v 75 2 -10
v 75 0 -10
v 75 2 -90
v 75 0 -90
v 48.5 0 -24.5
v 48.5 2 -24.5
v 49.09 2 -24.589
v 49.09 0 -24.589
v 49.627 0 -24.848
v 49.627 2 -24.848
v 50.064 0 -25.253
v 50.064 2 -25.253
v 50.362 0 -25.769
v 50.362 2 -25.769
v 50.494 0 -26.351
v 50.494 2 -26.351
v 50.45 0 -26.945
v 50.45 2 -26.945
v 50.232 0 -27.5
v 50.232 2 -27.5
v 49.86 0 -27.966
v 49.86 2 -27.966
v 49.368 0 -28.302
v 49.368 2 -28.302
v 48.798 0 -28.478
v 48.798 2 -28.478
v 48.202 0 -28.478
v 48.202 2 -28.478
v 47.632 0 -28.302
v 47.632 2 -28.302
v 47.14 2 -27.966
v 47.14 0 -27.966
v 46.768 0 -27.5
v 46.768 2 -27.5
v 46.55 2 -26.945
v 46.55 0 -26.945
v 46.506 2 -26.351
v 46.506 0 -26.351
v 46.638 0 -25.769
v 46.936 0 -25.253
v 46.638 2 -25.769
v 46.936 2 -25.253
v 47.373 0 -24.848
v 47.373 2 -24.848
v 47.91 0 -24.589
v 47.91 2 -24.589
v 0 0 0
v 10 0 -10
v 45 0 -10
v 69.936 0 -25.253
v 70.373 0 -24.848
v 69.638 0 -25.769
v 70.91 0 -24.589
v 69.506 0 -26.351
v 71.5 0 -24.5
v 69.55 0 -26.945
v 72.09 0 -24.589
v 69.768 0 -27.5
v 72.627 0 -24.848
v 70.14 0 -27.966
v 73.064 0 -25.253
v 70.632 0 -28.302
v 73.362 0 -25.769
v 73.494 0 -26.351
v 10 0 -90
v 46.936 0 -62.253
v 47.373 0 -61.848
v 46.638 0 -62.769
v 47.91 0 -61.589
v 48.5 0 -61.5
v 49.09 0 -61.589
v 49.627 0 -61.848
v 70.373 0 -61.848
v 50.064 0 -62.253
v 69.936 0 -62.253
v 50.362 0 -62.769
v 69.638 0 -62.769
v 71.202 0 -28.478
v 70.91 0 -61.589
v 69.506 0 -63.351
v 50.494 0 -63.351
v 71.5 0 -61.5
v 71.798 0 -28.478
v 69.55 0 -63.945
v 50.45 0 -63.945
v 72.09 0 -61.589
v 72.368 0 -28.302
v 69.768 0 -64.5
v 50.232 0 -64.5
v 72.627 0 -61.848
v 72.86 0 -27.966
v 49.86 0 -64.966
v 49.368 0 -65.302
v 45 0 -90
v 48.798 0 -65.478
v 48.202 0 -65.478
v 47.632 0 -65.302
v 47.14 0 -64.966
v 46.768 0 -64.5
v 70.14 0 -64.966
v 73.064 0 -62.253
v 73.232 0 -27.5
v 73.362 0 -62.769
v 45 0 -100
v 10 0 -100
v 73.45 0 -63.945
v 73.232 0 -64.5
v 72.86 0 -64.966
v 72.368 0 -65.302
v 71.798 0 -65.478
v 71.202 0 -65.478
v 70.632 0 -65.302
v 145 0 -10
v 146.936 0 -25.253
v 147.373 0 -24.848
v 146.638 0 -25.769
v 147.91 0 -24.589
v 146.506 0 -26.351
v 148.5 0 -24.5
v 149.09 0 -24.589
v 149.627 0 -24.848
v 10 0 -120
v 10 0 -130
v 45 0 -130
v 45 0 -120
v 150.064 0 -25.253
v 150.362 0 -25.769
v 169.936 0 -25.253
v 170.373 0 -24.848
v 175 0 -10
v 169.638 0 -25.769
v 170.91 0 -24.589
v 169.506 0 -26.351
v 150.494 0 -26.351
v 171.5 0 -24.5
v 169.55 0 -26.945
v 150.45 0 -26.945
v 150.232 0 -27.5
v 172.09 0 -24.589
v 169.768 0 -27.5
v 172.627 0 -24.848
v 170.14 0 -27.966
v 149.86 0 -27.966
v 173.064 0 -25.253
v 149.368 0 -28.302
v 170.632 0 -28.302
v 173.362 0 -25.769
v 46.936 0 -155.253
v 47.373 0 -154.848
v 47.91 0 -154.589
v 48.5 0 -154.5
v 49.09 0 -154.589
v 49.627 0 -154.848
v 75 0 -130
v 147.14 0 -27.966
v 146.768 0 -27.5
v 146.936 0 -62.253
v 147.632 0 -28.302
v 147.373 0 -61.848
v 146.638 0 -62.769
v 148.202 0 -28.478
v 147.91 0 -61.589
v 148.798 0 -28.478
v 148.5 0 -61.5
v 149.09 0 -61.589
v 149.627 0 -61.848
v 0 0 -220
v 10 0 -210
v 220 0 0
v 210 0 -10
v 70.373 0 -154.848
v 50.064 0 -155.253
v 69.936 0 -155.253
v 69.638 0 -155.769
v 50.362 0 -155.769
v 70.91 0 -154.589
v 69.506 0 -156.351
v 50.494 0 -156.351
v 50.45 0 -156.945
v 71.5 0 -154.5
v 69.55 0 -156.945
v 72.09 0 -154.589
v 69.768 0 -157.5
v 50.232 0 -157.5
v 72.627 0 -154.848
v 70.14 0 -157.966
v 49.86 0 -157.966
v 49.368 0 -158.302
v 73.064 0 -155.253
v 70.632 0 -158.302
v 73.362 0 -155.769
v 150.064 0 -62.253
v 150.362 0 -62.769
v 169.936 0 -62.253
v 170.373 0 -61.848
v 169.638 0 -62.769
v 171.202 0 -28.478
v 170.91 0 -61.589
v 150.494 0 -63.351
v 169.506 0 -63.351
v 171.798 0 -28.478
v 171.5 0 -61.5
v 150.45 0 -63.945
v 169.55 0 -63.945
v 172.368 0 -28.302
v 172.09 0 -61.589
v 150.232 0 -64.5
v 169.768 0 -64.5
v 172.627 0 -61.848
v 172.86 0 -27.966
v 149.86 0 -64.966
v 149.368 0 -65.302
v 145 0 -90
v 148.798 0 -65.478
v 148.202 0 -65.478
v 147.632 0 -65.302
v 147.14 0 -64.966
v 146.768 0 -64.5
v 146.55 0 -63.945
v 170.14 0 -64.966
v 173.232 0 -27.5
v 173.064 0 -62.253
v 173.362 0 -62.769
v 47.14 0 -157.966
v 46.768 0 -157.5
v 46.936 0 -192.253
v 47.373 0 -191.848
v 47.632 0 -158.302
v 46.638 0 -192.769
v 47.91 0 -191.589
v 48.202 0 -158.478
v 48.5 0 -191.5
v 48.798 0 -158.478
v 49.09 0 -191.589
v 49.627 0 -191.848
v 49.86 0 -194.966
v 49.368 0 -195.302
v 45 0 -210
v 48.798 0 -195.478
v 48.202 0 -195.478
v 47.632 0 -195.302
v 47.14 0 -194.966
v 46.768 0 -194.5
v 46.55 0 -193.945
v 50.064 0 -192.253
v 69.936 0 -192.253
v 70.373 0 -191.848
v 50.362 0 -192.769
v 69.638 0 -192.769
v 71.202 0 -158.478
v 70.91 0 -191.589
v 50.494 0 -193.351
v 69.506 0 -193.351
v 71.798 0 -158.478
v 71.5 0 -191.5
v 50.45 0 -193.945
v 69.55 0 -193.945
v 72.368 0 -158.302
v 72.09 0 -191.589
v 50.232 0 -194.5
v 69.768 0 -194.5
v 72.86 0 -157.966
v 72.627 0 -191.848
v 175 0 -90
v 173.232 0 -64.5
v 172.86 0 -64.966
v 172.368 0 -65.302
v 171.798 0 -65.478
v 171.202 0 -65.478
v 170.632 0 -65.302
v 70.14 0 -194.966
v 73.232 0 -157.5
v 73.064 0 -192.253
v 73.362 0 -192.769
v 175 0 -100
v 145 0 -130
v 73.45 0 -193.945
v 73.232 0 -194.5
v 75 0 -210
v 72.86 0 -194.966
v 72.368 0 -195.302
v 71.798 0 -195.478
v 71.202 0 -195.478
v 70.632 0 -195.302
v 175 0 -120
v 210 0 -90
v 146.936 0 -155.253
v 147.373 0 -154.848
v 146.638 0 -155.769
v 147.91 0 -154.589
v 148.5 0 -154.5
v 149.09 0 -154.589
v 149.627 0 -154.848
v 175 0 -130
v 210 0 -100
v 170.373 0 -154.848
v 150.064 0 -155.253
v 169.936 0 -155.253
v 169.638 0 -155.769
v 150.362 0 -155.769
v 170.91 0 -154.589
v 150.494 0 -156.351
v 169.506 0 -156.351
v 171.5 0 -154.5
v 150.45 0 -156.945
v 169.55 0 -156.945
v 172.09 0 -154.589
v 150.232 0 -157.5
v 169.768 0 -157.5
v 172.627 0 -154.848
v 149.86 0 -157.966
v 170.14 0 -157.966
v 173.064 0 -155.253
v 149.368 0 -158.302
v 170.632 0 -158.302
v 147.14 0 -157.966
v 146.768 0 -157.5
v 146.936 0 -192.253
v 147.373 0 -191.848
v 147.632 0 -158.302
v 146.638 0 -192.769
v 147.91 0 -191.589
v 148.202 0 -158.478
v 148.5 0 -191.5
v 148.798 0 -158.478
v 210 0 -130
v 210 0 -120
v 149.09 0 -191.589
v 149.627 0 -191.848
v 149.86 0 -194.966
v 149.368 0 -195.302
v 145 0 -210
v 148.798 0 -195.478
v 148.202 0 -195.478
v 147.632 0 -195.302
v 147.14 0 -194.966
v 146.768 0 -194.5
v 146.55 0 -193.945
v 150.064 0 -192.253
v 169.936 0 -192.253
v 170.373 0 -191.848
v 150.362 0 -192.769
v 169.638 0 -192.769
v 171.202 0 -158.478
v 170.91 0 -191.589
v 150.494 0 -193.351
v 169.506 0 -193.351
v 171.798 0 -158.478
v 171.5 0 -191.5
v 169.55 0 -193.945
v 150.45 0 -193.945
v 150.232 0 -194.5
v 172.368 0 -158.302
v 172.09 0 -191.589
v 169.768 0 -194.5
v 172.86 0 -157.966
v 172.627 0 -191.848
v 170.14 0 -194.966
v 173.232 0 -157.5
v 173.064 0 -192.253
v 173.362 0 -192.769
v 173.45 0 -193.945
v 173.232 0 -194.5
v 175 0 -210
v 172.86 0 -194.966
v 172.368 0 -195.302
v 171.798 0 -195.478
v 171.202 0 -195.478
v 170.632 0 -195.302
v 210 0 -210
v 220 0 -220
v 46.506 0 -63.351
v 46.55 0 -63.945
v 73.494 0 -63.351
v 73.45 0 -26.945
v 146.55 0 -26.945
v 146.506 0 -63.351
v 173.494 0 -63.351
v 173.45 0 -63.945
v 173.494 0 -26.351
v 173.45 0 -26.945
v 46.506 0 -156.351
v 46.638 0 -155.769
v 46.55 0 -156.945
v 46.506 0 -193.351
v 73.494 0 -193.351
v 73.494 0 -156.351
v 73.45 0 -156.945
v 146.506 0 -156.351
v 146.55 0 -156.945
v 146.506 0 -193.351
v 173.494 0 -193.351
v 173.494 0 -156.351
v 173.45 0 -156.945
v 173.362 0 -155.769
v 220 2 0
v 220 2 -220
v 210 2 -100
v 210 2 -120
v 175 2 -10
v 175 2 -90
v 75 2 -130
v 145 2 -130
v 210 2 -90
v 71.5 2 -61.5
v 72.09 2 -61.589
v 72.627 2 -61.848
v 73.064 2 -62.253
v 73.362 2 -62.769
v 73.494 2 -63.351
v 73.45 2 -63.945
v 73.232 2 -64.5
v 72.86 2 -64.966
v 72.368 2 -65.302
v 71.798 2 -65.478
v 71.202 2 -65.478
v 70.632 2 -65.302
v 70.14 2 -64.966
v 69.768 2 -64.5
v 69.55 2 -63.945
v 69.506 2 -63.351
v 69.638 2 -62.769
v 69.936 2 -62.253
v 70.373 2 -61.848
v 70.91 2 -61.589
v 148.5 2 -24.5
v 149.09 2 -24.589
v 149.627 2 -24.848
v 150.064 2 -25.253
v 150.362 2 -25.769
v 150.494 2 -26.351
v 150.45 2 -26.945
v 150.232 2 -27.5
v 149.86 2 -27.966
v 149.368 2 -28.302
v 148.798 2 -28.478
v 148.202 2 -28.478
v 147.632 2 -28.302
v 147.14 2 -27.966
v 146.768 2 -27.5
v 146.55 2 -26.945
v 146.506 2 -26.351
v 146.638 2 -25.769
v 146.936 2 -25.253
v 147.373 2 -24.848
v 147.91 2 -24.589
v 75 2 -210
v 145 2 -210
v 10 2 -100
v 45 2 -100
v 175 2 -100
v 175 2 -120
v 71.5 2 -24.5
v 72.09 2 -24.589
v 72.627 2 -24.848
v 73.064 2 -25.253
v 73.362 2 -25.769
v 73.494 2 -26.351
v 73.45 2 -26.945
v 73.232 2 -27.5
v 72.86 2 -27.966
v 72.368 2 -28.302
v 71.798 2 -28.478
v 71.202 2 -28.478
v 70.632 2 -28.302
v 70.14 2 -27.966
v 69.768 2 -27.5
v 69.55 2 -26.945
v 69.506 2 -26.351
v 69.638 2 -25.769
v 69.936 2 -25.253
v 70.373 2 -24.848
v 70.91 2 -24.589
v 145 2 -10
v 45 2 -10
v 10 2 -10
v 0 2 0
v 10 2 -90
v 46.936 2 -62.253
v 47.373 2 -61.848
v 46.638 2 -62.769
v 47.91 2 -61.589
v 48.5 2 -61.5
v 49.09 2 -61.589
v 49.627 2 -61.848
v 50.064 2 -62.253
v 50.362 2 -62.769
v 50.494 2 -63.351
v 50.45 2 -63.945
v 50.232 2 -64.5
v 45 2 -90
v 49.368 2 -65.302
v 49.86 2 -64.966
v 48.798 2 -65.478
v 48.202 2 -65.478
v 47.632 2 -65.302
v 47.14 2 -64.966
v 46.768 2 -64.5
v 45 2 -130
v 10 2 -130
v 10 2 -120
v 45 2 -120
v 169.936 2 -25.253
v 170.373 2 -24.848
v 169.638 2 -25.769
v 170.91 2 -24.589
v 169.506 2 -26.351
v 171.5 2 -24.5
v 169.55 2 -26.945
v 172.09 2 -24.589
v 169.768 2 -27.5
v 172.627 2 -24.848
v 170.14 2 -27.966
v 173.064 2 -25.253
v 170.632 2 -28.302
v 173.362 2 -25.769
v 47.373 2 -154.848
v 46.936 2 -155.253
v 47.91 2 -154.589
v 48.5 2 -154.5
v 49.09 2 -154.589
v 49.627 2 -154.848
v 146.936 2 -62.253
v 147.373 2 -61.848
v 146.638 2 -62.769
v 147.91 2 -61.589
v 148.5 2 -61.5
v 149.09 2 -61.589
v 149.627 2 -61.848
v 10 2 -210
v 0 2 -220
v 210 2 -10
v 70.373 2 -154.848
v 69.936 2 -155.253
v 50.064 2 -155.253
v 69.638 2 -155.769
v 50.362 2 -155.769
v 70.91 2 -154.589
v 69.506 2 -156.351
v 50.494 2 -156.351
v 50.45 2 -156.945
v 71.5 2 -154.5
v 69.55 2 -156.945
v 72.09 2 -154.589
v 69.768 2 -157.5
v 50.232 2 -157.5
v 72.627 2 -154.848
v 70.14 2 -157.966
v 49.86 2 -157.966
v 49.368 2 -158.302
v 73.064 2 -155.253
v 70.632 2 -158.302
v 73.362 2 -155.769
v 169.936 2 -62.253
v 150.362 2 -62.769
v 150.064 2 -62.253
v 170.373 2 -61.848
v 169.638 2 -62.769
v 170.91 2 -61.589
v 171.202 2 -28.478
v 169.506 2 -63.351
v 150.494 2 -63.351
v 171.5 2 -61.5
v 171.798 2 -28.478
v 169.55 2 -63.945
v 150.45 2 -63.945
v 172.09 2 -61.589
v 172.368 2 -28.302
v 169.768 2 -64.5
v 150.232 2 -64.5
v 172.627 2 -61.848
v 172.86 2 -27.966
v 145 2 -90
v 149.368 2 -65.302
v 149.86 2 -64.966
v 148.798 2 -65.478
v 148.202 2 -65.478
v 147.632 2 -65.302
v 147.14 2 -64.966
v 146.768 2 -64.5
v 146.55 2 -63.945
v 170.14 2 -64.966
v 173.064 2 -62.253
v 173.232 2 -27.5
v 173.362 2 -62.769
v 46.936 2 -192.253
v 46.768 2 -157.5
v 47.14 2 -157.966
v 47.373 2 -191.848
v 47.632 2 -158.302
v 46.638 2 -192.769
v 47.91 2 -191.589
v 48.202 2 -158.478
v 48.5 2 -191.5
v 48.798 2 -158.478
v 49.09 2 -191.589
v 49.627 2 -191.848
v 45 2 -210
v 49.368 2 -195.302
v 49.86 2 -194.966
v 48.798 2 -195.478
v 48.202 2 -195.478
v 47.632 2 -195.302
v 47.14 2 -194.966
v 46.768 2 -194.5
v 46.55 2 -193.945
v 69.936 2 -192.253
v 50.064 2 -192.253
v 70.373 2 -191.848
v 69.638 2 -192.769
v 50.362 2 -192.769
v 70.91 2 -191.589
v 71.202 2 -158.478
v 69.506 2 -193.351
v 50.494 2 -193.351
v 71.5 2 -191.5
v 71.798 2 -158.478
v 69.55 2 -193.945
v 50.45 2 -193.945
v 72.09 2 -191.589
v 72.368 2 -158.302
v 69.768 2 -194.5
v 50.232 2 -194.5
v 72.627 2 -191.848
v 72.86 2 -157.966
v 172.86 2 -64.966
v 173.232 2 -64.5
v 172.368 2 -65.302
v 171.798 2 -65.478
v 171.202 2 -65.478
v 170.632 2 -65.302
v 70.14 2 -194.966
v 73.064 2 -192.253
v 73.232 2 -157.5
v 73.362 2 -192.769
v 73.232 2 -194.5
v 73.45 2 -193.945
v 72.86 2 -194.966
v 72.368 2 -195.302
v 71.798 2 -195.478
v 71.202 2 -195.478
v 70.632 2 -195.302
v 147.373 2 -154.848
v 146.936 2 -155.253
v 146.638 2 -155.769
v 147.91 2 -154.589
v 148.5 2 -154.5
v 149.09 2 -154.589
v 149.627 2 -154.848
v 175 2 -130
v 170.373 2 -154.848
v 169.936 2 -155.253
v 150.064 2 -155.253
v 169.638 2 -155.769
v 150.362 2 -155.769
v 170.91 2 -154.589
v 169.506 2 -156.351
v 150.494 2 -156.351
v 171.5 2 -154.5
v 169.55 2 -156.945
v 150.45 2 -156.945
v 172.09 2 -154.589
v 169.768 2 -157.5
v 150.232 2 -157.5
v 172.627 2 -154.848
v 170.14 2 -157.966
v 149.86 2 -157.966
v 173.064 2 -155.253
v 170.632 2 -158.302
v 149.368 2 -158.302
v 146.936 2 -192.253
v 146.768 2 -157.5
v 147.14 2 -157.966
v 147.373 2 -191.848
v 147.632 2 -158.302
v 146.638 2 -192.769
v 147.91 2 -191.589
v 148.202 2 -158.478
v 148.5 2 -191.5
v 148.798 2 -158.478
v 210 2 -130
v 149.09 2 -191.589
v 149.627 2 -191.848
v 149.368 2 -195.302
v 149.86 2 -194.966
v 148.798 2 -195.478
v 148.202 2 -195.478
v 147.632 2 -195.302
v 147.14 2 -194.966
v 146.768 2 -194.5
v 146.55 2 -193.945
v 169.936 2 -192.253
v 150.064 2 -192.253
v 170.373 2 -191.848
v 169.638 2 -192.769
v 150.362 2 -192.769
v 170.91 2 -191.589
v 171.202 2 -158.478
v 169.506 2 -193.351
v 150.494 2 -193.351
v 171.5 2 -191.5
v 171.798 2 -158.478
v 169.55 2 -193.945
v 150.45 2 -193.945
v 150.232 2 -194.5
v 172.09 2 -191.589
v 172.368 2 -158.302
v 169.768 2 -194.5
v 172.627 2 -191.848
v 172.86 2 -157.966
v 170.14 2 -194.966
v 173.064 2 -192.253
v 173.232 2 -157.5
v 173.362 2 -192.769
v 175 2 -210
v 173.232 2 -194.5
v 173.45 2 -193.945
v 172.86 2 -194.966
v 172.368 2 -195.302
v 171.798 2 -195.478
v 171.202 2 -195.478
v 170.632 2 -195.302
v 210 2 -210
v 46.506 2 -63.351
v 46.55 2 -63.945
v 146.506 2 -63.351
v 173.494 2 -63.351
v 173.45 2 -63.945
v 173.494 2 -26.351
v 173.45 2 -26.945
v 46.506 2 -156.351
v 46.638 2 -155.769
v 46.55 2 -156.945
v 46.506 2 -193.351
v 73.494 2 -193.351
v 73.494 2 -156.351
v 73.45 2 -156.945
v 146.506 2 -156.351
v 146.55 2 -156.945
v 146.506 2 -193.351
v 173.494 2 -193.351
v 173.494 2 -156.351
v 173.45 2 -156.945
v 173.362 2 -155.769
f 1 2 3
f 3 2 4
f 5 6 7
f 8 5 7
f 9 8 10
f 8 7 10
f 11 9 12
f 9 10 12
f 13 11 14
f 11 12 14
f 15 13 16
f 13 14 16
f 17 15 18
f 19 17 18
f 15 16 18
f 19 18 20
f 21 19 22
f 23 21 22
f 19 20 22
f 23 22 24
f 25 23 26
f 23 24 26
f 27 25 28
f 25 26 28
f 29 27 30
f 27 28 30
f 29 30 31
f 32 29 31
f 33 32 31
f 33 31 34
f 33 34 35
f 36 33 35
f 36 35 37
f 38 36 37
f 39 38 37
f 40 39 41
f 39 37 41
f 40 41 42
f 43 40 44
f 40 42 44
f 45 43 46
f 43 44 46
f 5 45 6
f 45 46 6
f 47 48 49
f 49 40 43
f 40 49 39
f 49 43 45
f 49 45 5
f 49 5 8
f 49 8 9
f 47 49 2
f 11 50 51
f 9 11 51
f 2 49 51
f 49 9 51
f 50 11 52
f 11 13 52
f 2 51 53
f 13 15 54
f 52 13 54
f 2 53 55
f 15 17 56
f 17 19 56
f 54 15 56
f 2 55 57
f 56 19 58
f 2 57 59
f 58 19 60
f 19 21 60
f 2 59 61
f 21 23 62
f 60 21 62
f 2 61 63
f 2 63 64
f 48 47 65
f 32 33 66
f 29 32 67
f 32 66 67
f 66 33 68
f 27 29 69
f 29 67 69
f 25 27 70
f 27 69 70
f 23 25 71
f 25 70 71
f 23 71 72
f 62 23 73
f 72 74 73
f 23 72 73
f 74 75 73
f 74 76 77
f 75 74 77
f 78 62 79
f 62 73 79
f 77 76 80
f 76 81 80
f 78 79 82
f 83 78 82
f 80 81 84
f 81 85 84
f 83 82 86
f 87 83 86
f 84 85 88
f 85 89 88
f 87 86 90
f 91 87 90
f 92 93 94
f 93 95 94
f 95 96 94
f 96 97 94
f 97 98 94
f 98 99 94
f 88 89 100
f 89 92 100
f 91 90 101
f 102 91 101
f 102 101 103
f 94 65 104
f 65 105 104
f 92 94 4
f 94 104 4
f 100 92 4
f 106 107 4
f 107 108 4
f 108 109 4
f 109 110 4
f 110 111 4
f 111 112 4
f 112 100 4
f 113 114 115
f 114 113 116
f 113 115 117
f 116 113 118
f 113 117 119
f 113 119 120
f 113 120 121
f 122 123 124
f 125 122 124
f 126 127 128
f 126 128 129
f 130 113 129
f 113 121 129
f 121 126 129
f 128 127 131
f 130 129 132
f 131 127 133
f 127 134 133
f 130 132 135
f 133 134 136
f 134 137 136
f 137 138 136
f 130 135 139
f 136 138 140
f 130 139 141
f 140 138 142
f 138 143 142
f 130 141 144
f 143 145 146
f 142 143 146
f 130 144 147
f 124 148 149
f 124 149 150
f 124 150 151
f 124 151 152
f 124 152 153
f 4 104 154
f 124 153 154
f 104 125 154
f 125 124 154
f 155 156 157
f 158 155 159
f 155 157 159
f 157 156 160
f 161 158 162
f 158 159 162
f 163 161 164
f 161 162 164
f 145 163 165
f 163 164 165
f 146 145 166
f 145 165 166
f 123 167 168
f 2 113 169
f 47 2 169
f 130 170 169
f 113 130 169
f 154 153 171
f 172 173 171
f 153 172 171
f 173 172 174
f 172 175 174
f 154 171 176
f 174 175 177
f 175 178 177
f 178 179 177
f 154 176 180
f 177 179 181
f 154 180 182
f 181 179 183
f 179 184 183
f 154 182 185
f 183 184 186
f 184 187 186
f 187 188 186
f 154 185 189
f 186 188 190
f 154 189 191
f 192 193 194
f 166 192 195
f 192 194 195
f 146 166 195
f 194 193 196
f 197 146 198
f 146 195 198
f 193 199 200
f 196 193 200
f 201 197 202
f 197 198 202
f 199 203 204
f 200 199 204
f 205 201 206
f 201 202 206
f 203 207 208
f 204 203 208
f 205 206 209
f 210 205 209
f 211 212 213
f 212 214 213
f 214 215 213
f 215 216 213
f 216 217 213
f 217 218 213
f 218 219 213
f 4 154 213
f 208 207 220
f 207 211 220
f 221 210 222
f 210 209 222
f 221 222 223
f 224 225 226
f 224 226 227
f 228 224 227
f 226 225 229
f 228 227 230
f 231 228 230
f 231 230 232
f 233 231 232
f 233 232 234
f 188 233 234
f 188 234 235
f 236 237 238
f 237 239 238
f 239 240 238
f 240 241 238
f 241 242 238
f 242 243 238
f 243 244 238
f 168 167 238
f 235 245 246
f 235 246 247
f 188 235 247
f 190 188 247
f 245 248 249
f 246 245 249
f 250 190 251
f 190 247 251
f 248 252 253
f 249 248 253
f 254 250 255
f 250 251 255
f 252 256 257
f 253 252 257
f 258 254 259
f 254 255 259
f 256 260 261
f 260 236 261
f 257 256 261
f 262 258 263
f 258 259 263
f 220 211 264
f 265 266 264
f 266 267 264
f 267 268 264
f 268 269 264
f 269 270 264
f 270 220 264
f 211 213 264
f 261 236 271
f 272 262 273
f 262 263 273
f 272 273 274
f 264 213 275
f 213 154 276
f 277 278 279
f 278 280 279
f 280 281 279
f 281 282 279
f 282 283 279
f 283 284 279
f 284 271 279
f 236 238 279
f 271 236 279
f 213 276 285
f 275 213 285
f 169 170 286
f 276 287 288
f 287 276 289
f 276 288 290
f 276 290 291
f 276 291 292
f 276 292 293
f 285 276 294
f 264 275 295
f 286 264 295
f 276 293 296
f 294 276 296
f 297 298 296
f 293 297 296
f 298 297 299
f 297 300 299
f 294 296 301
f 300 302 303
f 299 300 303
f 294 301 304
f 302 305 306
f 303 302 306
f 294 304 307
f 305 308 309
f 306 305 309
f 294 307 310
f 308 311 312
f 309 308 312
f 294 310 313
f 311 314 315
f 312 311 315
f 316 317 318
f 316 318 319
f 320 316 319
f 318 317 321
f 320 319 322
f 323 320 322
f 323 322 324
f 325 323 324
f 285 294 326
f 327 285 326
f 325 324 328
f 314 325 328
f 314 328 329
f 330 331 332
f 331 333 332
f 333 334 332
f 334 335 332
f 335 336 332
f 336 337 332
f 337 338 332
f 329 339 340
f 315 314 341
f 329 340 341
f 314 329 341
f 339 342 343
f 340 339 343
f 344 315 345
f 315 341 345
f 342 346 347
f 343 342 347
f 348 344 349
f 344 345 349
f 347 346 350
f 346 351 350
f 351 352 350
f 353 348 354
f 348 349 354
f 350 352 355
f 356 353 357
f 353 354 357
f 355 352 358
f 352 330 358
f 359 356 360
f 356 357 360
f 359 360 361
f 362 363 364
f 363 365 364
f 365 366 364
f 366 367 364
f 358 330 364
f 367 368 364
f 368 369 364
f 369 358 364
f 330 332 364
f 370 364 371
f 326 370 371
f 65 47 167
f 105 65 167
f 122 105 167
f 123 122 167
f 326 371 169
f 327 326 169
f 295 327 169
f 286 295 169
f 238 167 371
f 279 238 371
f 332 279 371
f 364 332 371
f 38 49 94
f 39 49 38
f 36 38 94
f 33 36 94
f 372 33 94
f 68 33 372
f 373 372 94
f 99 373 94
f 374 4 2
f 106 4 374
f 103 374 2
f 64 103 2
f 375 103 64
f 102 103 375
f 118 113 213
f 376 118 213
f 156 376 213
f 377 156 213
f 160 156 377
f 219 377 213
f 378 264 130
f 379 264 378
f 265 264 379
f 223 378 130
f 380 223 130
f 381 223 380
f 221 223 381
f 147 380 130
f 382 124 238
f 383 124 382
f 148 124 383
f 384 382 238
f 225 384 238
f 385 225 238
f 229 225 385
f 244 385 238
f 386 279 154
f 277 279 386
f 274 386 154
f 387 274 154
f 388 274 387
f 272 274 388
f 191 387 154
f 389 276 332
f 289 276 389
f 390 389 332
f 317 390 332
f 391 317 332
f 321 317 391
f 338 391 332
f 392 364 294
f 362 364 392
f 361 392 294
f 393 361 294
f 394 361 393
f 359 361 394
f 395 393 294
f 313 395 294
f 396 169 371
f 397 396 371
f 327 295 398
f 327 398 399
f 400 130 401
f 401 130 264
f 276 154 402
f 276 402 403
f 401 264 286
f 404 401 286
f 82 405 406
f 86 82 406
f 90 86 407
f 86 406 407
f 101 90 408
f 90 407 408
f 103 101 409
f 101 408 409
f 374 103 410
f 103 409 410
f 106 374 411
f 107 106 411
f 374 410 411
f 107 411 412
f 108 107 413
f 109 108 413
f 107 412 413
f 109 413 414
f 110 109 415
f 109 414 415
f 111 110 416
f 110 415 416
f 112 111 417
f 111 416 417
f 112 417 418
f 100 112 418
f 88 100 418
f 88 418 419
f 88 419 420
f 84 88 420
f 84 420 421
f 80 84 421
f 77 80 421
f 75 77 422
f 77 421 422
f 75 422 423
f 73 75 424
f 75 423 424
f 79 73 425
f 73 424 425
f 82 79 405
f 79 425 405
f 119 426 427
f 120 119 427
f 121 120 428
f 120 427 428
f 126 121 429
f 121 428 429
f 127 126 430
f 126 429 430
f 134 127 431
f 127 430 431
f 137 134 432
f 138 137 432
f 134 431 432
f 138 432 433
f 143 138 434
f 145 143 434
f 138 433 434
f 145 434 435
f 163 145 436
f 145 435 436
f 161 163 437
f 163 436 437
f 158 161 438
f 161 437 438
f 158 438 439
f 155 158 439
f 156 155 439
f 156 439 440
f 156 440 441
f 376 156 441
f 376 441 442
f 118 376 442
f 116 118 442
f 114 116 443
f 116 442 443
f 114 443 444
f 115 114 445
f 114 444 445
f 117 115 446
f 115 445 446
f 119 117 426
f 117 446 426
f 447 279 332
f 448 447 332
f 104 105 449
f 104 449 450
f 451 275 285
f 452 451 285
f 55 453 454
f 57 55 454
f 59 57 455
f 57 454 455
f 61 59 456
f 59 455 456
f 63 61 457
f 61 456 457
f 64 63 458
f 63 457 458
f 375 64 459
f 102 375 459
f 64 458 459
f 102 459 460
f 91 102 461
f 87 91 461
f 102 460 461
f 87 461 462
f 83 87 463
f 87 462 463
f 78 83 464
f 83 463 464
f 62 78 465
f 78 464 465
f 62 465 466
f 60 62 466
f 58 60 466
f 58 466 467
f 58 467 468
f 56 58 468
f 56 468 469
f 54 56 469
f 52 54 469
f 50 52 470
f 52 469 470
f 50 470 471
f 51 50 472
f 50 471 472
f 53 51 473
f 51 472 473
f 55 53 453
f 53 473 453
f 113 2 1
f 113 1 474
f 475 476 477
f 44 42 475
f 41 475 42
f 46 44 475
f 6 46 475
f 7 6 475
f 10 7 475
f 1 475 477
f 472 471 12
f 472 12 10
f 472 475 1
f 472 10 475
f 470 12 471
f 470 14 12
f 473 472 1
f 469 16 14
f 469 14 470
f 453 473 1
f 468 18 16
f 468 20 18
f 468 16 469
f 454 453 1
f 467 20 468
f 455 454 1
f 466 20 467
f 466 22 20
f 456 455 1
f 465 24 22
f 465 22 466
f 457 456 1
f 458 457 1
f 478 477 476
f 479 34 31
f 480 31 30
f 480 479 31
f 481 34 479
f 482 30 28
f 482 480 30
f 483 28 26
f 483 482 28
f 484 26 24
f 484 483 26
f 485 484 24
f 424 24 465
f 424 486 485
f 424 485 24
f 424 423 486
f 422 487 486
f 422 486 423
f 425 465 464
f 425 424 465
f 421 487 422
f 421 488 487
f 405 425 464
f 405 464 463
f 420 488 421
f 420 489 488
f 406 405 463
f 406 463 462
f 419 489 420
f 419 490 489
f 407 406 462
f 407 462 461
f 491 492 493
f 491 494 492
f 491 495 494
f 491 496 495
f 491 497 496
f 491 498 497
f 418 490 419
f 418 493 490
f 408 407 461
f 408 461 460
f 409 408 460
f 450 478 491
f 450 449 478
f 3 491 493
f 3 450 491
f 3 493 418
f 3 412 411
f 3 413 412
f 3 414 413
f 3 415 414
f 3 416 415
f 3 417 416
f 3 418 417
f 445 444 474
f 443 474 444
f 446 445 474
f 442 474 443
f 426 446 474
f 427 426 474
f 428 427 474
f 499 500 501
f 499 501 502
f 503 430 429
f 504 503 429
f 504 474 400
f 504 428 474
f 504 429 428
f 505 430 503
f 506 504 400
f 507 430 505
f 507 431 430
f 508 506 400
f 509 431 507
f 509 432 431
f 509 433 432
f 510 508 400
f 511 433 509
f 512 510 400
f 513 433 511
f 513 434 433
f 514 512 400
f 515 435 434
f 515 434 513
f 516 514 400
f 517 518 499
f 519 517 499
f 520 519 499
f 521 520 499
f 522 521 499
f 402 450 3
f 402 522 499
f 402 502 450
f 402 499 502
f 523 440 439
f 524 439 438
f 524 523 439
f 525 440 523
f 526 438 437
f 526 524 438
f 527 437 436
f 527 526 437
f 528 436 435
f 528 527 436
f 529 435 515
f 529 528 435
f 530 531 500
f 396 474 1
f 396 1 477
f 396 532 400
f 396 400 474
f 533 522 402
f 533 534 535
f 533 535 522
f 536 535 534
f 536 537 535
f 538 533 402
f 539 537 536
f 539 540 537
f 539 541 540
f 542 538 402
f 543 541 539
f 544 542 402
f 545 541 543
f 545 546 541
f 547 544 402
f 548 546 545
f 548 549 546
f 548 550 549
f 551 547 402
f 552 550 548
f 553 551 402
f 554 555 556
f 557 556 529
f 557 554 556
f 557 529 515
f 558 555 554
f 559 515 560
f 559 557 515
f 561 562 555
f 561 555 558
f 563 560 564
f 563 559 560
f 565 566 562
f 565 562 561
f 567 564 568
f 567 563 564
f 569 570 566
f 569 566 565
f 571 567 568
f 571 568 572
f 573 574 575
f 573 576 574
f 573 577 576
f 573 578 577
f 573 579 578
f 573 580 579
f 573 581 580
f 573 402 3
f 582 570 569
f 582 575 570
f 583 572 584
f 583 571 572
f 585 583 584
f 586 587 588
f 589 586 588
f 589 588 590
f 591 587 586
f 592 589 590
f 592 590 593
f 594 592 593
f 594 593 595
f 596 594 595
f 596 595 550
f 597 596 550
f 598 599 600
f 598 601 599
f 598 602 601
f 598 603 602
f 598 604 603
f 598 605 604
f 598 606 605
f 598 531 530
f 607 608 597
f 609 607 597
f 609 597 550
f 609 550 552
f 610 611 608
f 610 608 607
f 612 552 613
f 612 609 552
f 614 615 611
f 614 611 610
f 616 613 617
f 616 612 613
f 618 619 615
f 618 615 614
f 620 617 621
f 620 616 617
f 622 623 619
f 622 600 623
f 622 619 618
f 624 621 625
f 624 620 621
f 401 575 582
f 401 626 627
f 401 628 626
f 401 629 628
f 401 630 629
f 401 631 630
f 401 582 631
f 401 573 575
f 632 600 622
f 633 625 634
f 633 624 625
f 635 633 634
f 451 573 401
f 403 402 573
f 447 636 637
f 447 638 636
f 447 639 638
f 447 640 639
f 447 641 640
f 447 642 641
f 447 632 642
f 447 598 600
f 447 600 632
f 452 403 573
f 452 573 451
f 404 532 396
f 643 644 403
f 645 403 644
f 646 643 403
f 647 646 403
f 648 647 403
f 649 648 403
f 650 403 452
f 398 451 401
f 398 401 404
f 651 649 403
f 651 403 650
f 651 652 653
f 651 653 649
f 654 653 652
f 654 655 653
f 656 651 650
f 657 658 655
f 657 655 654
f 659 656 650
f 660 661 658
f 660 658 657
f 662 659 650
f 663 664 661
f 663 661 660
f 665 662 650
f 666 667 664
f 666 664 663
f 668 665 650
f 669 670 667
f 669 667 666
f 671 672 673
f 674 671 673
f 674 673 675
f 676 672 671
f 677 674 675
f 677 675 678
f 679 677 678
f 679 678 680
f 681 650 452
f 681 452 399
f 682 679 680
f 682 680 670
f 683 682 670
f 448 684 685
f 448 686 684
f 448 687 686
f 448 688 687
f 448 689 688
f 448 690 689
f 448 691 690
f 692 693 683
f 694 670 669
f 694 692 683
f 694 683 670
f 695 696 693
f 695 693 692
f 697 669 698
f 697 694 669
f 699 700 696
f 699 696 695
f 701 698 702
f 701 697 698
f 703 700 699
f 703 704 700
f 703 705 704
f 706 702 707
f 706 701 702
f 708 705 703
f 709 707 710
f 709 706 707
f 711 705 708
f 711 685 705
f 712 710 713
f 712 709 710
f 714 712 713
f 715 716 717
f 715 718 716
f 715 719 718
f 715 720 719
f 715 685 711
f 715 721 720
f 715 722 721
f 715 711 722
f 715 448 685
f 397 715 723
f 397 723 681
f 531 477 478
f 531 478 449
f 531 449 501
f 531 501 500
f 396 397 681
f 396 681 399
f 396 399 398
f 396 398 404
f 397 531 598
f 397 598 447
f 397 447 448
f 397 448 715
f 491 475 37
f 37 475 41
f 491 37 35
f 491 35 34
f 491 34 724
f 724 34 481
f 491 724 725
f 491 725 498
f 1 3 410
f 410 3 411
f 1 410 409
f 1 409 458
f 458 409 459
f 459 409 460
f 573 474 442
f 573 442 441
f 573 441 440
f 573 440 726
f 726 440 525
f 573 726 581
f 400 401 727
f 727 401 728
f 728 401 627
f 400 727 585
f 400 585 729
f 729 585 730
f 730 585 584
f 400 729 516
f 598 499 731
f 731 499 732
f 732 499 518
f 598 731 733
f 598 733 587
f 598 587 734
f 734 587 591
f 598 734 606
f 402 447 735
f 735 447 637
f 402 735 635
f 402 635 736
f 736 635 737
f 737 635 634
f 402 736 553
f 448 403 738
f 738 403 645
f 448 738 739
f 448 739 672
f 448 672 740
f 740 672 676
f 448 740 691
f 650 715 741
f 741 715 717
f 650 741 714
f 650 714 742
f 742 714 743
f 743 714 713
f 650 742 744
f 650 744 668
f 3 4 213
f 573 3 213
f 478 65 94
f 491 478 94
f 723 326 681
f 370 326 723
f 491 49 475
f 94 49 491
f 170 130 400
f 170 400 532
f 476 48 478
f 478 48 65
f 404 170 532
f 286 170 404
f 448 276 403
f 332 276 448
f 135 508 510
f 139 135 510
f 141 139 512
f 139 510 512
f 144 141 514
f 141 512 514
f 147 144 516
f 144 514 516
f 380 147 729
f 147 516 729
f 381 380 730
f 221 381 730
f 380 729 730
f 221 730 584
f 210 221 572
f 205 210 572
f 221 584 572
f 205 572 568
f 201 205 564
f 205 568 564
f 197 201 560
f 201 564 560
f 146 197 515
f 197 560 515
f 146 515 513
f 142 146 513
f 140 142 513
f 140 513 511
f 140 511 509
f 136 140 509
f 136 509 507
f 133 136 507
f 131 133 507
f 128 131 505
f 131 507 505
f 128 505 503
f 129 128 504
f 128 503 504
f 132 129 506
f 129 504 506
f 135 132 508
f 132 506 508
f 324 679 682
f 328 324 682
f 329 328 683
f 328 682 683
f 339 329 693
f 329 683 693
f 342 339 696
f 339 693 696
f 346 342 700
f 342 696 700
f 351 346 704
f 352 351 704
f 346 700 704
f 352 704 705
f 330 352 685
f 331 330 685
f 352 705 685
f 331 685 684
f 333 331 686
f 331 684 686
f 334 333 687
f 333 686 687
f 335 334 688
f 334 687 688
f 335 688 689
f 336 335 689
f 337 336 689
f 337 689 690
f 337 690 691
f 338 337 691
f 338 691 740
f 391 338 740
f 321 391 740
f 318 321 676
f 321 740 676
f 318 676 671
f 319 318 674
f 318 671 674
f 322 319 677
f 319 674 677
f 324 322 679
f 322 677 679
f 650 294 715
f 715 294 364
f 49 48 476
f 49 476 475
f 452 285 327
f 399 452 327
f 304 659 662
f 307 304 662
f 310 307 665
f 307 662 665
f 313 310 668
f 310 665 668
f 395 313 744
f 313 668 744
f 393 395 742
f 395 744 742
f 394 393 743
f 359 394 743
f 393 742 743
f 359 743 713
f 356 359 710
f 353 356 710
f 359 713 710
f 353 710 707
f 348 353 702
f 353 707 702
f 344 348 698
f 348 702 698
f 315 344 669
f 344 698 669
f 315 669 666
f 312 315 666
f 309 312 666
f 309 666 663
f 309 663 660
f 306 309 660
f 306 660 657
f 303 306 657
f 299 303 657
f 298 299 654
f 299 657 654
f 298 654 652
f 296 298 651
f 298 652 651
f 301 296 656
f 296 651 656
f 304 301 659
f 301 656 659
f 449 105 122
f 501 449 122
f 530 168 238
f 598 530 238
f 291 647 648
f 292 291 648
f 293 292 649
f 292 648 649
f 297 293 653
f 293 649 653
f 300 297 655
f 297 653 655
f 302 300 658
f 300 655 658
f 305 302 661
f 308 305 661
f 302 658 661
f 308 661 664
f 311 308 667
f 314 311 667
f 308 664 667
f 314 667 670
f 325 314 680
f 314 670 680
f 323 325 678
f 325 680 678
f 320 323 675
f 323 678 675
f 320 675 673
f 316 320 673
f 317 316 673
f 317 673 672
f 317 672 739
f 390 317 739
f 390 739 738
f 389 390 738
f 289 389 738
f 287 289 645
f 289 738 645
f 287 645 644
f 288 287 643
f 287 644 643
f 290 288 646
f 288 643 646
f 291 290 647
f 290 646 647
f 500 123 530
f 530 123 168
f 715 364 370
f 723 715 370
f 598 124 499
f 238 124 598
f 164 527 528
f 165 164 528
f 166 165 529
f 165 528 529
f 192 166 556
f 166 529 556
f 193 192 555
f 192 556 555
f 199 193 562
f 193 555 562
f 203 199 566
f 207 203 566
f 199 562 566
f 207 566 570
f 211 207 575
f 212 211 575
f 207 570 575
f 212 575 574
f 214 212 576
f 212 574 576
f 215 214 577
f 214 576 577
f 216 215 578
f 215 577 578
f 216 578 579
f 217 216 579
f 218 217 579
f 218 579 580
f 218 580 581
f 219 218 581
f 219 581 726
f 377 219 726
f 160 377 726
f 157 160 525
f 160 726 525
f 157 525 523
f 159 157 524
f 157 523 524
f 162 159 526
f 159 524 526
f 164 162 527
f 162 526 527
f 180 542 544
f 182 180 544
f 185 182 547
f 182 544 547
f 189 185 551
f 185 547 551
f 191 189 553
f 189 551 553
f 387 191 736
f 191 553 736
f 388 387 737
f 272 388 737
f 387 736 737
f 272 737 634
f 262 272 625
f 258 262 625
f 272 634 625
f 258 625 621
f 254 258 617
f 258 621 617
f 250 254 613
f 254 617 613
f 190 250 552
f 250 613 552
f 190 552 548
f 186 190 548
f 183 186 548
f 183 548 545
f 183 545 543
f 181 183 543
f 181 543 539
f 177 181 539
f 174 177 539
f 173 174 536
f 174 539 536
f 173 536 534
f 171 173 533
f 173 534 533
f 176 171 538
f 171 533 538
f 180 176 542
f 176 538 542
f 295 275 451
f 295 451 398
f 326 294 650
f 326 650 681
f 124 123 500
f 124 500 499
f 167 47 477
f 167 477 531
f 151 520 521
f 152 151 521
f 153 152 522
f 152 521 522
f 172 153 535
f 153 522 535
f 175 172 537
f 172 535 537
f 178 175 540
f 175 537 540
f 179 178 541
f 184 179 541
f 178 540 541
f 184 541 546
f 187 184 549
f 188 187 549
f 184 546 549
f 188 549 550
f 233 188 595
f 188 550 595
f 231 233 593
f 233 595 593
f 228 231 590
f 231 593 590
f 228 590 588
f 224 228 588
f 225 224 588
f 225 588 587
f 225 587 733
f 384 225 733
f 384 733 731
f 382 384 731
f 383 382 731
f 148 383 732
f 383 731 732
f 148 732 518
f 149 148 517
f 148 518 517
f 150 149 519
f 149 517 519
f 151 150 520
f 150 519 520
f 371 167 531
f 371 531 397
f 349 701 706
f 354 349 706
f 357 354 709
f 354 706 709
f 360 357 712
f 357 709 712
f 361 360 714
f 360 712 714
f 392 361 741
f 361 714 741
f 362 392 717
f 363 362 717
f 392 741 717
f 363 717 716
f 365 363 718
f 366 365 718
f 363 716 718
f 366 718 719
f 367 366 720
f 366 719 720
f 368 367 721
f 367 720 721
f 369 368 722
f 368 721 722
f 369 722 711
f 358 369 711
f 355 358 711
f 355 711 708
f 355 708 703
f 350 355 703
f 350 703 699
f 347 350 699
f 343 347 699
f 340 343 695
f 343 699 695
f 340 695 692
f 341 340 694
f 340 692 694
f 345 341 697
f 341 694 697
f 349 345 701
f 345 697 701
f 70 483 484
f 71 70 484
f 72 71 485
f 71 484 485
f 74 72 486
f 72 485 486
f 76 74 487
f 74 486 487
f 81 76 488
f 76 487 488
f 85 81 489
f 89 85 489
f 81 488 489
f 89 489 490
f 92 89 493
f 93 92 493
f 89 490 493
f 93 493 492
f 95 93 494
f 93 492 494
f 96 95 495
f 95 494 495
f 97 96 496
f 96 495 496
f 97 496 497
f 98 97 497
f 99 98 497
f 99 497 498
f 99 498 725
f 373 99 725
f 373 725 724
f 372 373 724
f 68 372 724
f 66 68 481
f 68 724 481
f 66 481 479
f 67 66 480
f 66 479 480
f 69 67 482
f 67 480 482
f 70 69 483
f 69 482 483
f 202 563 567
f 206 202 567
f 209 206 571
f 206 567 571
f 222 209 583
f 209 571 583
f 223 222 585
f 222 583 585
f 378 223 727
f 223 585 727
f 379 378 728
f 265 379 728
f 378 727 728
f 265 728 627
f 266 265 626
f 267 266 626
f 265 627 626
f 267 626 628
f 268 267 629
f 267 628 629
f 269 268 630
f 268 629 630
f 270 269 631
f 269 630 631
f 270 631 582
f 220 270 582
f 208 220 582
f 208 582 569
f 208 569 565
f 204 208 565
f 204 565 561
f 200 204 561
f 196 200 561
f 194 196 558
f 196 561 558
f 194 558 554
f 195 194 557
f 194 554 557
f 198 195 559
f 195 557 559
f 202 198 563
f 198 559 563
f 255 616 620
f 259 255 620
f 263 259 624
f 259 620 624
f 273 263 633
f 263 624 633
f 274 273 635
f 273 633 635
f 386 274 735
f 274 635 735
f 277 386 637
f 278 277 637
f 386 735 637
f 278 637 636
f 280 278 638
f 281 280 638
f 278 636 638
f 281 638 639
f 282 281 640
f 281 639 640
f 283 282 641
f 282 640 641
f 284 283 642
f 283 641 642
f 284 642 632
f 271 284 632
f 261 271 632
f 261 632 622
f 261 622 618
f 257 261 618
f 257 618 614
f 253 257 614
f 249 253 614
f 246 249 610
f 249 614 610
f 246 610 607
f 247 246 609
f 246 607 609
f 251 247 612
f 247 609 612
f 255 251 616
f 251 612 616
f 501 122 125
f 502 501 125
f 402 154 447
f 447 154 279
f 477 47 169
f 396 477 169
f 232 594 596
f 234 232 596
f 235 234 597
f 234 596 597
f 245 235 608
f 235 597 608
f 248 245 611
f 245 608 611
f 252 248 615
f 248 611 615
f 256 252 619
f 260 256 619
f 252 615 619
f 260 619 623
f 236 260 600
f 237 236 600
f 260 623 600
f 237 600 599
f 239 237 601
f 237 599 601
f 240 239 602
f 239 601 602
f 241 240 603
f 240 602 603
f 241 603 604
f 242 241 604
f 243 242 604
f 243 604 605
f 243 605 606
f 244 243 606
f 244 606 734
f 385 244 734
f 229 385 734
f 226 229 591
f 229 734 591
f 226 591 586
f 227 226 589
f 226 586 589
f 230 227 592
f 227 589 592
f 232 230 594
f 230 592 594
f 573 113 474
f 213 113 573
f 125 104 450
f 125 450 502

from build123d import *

# Parameters (mm, degrees)
SKETCH_2_W          = 220
SKETCH_2_H          = 220
SKETCH_2_W_2        = 35
SKETCH_2_H_2        = 80
SKETCH_2_W_3        = 70
SKETCH_2_H_3        = 20
EXTRUDE_1_DEPTH     = 2
SKETCH_3_R          = 2
CUT_EXTRUDE_1_DEPTH = 2


with BuildPart() as part:
    # Эскиз2 → Бобышка-Вытянуть1 (new body)
    with BuildSketch(Plane(origin=(0, 0, 0), x_dir=(1, 0, 0), z_dir=(0, 1, 0))):
        with Locations((110, 110)):
            Rectangle(SKETCH_2_W, SKETCH_2_H)
        with Locations((27.5, 170)):
            Rectangle(SKETCH_2_W_2, SKETCH_2_H_2, mode=Mode.SUBTRACT)
        with Locations((110, 170)):
            Rectangle(SKETCH_2_W_3, SKETCH_2_H_2, mode=Mode.SUBTRACT)
        with Locations((192.5, 170)):
            Rectangle(SKETCH_2_W_2, SKETCH_2_H_2, mode=Mode.SUBTRACT)
        with Locations((192.5, 50)):
            Rectangle(SKETCH_2_W_2, SKETCH_2_H_2, mode=Mode.SUBTRACT)
        with Locations((110, 50)):
            Rectangle(SKETCH_2_W_3, SKETCH_2_H_2, mode=Mode.SUBTRACT)
        with Locations((27.5, 50)):
            Rectangle(SKETCH_2_W_2, SKETCH_2_H_2, mode=Mode.SUBTRACT)
        with Locations((27.5, 110)):
            Rectangle(SKETCH_2_W_2, SKETCH_2_H_3, mode=Mode.SUBTRACT)
        with Locations((192.5, 110)):
            Rectangle(SKETCH_2_W_2, SKETCH_2_H_3, mode=Mode.SUBTRACT)
    extrude(amount=EXTRUDE_1_DEPTH)

    # Эскиз3 → Вырез-Вытянуть1 (cut)
    with BuildSketch(Plane(origin=(0, 2, 0), x_dir=(1, 0, 0), z_dir=(0, 1, 0))):
        with Locations(Location((171.5, 26.5, 0), (0, 0, 270))):
            Circle(SKETCH_3_R)
        with Locations(Location((148.5, 26.5, 0), (0, 0, 270))):
            Circle(SKETCH_3_R)
        with Locations(Location((71.5, 26.5, 0), (0, 0, 270))):
            Circle(SKETCH_3_R)
        with Locations(Location((48.5, 26.5, 0), (0, 0, 270))):
            Circle(SKETCH_3_R)
        with Locations(Location((48.5, 63.5, 0), (0, 0, 270))):
            Circle(SKETCH_3_R)
        with Locations(Location((71.5, 63.5, 0), (0, 0, 270))):
            Circle(SKETCH_3_R)
        with Locations(Location((148.5, 63.5, 0), (0, 0, 270))):
            Circle(SKETCH_3_R)
        with Locations(Location((171.5, 63.5, 0), (0, 0, 270))):
            Circle(SKETCH_3_R)
        with Locations(Location((171.5, 156.5, 0), (0, 0, 270))):
            Circle(SKETCH_3_R)
        with Locations(Location((148.5, 156.5, 0), (0, 0, 270))):
            Circle(SKETCH_3_R)
        with Locations(Location((148.5, 193.5, 0), (0, 0, 270))):
            Circle(SKETCH_3_R)
        with Locations(Location((171.5, 193.5, 0), (0, 0, 270))):
            Circle(SKETCH_3_R)
        with Locations(Location((71.5, 193.5, 0), (0, 0, 270))):
            Circle(SKETCH_3_R)
        with Locations(Location((71.5, 156.5, 0), (0, 0, 270))):
            Circle(SKETCH_3_R)
        with Locations(Location((48.5, 156.5, 0), (0, 0, 270))):
            Circle(SKETCH_3_R)
        with Locations(Location((48.5, 193.5, 0), (0, 0, 270))):
            Circle(SKETCH_3_R)
    extrude(amount=-CUT_EXTRUDE_1_DEPTH, mode=Mode.SUBTRACT)


solid = part.part
